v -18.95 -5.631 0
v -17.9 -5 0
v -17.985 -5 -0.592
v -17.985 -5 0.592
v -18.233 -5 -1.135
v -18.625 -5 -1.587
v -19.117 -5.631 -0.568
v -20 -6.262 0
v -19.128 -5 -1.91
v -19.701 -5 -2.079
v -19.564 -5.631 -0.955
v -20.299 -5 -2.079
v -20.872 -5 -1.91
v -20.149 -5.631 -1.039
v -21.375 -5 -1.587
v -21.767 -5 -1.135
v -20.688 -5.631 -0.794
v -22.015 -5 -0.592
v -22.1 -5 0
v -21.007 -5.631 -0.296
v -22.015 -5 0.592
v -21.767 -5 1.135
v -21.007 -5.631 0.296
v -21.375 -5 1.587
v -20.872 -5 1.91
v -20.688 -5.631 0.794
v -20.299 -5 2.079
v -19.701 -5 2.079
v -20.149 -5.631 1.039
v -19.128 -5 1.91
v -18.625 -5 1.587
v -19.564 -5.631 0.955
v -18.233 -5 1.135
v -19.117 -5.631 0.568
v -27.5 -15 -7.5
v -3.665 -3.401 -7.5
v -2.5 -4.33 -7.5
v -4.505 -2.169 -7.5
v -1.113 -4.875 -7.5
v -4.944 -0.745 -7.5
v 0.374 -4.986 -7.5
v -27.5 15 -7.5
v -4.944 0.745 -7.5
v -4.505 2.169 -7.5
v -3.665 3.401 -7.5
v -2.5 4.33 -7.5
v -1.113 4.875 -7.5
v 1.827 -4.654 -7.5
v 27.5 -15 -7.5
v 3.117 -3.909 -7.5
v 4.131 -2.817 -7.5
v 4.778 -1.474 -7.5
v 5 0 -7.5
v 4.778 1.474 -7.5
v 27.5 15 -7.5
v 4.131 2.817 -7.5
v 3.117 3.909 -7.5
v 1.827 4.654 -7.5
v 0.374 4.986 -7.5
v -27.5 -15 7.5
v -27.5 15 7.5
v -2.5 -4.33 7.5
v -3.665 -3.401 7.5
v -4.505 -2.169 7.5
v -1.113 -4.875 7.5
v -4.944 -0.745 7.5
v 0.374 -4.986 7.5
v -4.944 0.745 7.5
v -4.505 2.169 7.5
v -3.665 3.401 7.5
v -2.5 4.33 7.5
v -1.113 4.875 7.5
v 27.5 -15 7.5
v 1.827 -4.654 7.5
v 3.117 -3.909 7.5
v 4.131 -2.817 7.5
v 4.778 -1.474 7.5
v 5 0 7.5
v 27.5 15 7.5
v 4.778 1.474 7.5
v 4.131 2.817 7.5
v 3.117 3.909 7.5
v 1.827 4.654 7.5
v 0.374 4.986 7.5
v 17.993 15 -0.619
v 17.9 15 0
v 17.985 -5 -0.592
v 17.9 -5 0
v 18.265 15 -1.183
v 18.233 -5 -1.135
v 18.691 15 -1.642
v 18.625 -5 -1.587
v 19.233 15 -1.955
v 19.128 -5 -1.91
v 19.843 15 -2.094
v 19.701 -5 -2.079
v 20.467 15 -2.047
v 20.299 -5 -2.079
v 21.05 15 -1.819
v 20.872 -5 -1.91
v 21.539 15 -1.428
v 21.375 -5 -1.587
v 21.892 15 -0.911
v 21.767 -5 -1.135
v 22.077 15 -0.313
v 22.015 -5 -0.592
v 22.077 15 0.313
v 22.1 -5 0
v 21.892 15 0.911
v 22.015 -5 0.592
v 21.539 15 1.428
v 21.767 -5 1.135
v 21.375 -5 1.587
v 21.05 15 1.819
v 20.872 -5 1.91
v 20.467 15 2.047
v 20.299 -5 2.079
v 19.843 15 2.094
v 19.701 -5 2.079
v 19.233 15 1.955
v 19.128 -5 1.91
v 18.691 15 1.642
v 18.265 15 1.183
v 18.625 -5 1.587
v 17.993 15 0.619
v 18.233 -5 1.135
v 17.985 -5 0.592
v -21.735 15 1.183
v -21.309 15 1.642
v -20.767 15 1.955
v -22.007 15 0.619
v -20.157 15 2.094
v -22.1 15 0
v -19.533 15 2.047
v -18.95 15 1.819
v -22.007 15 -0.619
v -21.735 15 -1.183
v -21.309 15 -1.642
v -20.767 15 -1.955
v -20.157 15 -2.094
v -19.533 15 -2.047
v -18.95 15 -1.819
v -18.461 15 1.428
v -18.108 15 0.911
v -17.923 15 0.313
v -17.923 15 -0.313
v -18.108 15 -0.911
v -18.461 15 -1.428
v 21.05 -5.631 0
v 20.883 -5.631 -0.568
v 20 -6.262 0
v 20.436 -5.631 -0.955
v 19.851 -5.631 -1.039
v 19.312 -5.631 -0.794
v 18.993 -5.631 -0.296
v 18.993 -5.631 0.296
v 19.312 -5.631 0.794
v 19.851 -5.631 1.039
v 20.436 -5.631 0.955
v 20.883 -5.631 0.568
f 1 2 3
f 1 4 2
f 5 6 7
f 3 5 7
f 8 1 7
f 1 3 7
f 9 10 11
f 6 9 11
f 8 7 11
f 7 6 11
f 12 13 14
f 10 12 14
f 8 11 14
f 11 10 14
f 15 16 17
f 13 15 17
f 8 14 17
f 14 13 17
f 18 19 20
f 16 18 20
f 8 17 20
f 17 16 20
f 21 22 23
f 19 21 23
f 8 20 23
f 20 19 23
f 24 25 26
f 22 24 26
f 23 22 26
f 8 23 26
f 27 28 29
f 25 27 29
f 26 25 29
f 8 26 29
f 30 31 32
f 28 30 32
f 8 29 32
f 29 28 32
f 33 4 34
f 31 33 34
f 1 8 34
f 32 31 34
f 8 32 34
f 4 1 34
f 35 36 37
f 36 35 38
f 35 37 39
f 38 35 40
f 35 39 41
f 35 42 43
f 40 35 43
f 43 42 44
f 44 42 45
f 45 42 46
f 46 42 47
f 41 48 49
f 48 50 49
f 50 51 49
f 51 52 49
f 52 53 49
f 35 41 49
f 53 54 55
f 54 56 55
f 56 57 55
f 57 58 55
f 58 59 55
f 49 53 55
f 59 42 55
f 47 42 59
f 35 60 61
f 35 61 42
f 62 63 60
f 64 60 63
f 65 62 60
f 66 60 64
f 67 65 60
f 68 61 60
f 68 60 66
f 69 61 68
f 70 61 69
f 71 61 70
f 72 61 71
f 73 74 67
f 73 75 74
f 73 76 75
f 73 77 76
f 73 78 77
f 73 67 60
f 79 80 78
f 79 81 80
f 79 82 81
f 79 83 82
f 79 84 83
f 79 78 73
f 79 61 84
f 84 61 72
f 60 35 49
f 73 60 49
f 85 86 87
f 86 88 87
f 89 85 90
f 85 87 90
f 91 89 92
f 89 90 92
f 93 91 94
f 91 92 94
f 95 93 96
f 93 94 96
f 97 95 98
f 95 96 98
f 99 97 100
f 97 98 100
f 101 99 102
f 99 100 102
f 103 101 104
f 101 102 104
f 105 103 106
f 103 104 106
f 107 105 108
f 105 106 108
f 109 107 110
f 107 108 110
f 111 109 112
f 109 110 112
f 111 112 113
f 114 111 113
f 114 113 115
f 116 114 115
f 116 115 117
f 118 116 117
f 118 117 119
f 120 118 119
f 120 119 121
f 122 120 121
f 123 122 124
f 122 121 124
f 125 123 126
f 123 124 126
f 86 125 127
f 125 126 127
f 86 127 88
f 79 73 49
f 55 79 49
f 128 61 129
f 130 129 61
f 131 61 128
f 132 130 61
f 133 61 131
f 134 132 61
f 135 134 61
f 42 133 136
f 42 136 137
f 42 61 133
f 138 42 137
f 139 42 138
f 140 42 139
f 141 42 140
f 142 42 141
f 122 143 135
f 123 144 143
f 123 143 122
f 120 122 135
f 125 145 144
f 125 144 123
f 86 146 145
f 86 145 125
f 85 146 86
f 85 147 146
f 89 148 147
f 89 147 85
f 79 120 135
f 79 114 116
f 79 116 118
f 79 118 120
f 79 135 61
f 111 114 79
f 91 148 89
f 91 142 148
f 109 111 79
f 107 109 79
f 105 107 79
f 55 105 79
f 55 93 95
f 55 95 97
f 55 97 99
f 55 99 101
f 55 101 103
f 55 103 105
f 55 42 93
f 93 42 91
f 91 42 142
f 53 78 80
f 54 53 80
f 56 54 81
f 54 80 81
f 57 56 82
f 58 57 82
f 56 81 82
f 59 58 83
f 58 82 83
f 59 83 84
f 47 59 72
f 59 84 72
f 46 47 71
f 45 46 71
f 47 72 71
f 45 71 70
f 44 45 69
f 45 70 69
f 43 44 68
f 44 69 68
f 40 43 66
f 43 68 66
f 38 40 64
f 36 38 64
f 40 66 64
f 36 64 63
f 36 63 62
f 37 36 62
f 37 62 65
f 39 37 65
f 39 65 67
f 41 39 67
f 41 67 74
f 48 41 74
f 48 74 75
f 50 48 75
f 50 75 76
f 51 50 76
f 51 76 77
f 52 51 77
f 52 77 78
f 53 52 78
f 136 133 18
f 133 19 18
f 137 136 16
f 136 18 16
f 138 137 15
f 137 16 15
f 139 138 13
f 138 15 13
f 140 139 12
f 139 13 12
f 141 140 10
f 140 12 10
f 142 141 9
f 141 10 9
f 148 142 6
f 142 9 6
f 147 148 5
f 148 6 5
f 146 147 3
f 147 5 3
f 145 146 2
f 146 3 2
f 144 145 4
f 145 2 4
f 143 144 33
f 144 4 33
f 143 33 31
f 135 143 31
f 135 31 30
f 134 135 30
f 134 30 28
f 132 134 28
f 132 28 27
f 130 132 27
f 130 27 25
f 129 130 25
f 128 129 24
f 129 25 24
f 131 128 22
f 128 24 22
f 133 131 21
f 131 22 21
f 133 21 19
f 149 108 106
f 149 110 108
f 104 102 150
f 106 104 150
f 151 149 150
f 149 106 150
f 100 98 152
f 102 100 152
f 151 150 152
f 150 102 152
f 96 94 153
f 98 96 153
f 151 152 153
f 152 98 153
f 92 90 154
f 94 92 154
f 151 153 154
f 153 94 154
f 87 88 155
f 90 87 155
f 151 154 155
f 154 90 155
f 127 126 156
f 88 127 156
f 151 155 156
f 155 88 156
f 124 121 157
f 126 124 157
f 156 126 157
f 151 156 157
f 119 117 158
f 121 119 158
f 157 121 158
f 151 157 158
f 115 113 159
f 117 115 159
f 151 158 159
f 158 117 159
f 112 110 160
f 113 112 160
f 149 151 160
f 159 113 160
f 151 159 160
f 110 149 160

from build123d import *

# Parameters (mm, degrees)
SKETCH1_W             = 55
SKETCH1_H             = 15
BOSS_EXTRUDE1_DEPTH   = 15
SKETCH3_R             = 5
CUT_EXTRUDE1_DEPTH    = 35.731109974
M5_TAPPED_HOLE1_D     = 4.2
M5_TAPPED_HOLE1_DEPTH = 20
M5_TAPPED_HOLE1_TIP   = 1.2618073


with BuildPart() as part:
    # Sketch1 → Boss-Extrude1 (new, symmetric)
    with BuildSketch(Plane(origin=(0, 0, 0), x_dir=(1, 0, 0), z_dir=(0, 1, 0))):
        Rectangle(SKETCH1_W, SKETCH1_H)
    extrude(amount=BOSS_EXTRUDE1_DEPTH, both=True)

    # Sketch3 → Cut-Extrude1 (cut, through all)
    with BuildSketch(Plane.XY.offset(7.5)):
        Circle(SKETCH3_R)
    extrude(amount=-CUT_EXTRUDE1_DEPTH, mode=Mode.SUBTRACT)

    # M5 Tapped Hole1
    with Locations(Plane(origin=(0, 15, 0), x_dir=(1, 0, 0), z_dir=(0, 1, 0))):
        with Locations((-20, 0), (20, 0)):
            Hole(M5_TAPPED_HOLE1_D / 2, depth=M5_TAPPED_HOLE1_DEPTH)
            with Locations((0, 0, -(M5_TAPPED_HOLE1_DEPTH + M5_TAPPED_HOLE1_TIP / 2))):  # 118° drill point
                Cone(0, M5_TAPPED_HOLE1_D / 2, M5_TAPPED_HOLE1_TIP, mode=Mode.SUBTRACT)


solid = part.part
